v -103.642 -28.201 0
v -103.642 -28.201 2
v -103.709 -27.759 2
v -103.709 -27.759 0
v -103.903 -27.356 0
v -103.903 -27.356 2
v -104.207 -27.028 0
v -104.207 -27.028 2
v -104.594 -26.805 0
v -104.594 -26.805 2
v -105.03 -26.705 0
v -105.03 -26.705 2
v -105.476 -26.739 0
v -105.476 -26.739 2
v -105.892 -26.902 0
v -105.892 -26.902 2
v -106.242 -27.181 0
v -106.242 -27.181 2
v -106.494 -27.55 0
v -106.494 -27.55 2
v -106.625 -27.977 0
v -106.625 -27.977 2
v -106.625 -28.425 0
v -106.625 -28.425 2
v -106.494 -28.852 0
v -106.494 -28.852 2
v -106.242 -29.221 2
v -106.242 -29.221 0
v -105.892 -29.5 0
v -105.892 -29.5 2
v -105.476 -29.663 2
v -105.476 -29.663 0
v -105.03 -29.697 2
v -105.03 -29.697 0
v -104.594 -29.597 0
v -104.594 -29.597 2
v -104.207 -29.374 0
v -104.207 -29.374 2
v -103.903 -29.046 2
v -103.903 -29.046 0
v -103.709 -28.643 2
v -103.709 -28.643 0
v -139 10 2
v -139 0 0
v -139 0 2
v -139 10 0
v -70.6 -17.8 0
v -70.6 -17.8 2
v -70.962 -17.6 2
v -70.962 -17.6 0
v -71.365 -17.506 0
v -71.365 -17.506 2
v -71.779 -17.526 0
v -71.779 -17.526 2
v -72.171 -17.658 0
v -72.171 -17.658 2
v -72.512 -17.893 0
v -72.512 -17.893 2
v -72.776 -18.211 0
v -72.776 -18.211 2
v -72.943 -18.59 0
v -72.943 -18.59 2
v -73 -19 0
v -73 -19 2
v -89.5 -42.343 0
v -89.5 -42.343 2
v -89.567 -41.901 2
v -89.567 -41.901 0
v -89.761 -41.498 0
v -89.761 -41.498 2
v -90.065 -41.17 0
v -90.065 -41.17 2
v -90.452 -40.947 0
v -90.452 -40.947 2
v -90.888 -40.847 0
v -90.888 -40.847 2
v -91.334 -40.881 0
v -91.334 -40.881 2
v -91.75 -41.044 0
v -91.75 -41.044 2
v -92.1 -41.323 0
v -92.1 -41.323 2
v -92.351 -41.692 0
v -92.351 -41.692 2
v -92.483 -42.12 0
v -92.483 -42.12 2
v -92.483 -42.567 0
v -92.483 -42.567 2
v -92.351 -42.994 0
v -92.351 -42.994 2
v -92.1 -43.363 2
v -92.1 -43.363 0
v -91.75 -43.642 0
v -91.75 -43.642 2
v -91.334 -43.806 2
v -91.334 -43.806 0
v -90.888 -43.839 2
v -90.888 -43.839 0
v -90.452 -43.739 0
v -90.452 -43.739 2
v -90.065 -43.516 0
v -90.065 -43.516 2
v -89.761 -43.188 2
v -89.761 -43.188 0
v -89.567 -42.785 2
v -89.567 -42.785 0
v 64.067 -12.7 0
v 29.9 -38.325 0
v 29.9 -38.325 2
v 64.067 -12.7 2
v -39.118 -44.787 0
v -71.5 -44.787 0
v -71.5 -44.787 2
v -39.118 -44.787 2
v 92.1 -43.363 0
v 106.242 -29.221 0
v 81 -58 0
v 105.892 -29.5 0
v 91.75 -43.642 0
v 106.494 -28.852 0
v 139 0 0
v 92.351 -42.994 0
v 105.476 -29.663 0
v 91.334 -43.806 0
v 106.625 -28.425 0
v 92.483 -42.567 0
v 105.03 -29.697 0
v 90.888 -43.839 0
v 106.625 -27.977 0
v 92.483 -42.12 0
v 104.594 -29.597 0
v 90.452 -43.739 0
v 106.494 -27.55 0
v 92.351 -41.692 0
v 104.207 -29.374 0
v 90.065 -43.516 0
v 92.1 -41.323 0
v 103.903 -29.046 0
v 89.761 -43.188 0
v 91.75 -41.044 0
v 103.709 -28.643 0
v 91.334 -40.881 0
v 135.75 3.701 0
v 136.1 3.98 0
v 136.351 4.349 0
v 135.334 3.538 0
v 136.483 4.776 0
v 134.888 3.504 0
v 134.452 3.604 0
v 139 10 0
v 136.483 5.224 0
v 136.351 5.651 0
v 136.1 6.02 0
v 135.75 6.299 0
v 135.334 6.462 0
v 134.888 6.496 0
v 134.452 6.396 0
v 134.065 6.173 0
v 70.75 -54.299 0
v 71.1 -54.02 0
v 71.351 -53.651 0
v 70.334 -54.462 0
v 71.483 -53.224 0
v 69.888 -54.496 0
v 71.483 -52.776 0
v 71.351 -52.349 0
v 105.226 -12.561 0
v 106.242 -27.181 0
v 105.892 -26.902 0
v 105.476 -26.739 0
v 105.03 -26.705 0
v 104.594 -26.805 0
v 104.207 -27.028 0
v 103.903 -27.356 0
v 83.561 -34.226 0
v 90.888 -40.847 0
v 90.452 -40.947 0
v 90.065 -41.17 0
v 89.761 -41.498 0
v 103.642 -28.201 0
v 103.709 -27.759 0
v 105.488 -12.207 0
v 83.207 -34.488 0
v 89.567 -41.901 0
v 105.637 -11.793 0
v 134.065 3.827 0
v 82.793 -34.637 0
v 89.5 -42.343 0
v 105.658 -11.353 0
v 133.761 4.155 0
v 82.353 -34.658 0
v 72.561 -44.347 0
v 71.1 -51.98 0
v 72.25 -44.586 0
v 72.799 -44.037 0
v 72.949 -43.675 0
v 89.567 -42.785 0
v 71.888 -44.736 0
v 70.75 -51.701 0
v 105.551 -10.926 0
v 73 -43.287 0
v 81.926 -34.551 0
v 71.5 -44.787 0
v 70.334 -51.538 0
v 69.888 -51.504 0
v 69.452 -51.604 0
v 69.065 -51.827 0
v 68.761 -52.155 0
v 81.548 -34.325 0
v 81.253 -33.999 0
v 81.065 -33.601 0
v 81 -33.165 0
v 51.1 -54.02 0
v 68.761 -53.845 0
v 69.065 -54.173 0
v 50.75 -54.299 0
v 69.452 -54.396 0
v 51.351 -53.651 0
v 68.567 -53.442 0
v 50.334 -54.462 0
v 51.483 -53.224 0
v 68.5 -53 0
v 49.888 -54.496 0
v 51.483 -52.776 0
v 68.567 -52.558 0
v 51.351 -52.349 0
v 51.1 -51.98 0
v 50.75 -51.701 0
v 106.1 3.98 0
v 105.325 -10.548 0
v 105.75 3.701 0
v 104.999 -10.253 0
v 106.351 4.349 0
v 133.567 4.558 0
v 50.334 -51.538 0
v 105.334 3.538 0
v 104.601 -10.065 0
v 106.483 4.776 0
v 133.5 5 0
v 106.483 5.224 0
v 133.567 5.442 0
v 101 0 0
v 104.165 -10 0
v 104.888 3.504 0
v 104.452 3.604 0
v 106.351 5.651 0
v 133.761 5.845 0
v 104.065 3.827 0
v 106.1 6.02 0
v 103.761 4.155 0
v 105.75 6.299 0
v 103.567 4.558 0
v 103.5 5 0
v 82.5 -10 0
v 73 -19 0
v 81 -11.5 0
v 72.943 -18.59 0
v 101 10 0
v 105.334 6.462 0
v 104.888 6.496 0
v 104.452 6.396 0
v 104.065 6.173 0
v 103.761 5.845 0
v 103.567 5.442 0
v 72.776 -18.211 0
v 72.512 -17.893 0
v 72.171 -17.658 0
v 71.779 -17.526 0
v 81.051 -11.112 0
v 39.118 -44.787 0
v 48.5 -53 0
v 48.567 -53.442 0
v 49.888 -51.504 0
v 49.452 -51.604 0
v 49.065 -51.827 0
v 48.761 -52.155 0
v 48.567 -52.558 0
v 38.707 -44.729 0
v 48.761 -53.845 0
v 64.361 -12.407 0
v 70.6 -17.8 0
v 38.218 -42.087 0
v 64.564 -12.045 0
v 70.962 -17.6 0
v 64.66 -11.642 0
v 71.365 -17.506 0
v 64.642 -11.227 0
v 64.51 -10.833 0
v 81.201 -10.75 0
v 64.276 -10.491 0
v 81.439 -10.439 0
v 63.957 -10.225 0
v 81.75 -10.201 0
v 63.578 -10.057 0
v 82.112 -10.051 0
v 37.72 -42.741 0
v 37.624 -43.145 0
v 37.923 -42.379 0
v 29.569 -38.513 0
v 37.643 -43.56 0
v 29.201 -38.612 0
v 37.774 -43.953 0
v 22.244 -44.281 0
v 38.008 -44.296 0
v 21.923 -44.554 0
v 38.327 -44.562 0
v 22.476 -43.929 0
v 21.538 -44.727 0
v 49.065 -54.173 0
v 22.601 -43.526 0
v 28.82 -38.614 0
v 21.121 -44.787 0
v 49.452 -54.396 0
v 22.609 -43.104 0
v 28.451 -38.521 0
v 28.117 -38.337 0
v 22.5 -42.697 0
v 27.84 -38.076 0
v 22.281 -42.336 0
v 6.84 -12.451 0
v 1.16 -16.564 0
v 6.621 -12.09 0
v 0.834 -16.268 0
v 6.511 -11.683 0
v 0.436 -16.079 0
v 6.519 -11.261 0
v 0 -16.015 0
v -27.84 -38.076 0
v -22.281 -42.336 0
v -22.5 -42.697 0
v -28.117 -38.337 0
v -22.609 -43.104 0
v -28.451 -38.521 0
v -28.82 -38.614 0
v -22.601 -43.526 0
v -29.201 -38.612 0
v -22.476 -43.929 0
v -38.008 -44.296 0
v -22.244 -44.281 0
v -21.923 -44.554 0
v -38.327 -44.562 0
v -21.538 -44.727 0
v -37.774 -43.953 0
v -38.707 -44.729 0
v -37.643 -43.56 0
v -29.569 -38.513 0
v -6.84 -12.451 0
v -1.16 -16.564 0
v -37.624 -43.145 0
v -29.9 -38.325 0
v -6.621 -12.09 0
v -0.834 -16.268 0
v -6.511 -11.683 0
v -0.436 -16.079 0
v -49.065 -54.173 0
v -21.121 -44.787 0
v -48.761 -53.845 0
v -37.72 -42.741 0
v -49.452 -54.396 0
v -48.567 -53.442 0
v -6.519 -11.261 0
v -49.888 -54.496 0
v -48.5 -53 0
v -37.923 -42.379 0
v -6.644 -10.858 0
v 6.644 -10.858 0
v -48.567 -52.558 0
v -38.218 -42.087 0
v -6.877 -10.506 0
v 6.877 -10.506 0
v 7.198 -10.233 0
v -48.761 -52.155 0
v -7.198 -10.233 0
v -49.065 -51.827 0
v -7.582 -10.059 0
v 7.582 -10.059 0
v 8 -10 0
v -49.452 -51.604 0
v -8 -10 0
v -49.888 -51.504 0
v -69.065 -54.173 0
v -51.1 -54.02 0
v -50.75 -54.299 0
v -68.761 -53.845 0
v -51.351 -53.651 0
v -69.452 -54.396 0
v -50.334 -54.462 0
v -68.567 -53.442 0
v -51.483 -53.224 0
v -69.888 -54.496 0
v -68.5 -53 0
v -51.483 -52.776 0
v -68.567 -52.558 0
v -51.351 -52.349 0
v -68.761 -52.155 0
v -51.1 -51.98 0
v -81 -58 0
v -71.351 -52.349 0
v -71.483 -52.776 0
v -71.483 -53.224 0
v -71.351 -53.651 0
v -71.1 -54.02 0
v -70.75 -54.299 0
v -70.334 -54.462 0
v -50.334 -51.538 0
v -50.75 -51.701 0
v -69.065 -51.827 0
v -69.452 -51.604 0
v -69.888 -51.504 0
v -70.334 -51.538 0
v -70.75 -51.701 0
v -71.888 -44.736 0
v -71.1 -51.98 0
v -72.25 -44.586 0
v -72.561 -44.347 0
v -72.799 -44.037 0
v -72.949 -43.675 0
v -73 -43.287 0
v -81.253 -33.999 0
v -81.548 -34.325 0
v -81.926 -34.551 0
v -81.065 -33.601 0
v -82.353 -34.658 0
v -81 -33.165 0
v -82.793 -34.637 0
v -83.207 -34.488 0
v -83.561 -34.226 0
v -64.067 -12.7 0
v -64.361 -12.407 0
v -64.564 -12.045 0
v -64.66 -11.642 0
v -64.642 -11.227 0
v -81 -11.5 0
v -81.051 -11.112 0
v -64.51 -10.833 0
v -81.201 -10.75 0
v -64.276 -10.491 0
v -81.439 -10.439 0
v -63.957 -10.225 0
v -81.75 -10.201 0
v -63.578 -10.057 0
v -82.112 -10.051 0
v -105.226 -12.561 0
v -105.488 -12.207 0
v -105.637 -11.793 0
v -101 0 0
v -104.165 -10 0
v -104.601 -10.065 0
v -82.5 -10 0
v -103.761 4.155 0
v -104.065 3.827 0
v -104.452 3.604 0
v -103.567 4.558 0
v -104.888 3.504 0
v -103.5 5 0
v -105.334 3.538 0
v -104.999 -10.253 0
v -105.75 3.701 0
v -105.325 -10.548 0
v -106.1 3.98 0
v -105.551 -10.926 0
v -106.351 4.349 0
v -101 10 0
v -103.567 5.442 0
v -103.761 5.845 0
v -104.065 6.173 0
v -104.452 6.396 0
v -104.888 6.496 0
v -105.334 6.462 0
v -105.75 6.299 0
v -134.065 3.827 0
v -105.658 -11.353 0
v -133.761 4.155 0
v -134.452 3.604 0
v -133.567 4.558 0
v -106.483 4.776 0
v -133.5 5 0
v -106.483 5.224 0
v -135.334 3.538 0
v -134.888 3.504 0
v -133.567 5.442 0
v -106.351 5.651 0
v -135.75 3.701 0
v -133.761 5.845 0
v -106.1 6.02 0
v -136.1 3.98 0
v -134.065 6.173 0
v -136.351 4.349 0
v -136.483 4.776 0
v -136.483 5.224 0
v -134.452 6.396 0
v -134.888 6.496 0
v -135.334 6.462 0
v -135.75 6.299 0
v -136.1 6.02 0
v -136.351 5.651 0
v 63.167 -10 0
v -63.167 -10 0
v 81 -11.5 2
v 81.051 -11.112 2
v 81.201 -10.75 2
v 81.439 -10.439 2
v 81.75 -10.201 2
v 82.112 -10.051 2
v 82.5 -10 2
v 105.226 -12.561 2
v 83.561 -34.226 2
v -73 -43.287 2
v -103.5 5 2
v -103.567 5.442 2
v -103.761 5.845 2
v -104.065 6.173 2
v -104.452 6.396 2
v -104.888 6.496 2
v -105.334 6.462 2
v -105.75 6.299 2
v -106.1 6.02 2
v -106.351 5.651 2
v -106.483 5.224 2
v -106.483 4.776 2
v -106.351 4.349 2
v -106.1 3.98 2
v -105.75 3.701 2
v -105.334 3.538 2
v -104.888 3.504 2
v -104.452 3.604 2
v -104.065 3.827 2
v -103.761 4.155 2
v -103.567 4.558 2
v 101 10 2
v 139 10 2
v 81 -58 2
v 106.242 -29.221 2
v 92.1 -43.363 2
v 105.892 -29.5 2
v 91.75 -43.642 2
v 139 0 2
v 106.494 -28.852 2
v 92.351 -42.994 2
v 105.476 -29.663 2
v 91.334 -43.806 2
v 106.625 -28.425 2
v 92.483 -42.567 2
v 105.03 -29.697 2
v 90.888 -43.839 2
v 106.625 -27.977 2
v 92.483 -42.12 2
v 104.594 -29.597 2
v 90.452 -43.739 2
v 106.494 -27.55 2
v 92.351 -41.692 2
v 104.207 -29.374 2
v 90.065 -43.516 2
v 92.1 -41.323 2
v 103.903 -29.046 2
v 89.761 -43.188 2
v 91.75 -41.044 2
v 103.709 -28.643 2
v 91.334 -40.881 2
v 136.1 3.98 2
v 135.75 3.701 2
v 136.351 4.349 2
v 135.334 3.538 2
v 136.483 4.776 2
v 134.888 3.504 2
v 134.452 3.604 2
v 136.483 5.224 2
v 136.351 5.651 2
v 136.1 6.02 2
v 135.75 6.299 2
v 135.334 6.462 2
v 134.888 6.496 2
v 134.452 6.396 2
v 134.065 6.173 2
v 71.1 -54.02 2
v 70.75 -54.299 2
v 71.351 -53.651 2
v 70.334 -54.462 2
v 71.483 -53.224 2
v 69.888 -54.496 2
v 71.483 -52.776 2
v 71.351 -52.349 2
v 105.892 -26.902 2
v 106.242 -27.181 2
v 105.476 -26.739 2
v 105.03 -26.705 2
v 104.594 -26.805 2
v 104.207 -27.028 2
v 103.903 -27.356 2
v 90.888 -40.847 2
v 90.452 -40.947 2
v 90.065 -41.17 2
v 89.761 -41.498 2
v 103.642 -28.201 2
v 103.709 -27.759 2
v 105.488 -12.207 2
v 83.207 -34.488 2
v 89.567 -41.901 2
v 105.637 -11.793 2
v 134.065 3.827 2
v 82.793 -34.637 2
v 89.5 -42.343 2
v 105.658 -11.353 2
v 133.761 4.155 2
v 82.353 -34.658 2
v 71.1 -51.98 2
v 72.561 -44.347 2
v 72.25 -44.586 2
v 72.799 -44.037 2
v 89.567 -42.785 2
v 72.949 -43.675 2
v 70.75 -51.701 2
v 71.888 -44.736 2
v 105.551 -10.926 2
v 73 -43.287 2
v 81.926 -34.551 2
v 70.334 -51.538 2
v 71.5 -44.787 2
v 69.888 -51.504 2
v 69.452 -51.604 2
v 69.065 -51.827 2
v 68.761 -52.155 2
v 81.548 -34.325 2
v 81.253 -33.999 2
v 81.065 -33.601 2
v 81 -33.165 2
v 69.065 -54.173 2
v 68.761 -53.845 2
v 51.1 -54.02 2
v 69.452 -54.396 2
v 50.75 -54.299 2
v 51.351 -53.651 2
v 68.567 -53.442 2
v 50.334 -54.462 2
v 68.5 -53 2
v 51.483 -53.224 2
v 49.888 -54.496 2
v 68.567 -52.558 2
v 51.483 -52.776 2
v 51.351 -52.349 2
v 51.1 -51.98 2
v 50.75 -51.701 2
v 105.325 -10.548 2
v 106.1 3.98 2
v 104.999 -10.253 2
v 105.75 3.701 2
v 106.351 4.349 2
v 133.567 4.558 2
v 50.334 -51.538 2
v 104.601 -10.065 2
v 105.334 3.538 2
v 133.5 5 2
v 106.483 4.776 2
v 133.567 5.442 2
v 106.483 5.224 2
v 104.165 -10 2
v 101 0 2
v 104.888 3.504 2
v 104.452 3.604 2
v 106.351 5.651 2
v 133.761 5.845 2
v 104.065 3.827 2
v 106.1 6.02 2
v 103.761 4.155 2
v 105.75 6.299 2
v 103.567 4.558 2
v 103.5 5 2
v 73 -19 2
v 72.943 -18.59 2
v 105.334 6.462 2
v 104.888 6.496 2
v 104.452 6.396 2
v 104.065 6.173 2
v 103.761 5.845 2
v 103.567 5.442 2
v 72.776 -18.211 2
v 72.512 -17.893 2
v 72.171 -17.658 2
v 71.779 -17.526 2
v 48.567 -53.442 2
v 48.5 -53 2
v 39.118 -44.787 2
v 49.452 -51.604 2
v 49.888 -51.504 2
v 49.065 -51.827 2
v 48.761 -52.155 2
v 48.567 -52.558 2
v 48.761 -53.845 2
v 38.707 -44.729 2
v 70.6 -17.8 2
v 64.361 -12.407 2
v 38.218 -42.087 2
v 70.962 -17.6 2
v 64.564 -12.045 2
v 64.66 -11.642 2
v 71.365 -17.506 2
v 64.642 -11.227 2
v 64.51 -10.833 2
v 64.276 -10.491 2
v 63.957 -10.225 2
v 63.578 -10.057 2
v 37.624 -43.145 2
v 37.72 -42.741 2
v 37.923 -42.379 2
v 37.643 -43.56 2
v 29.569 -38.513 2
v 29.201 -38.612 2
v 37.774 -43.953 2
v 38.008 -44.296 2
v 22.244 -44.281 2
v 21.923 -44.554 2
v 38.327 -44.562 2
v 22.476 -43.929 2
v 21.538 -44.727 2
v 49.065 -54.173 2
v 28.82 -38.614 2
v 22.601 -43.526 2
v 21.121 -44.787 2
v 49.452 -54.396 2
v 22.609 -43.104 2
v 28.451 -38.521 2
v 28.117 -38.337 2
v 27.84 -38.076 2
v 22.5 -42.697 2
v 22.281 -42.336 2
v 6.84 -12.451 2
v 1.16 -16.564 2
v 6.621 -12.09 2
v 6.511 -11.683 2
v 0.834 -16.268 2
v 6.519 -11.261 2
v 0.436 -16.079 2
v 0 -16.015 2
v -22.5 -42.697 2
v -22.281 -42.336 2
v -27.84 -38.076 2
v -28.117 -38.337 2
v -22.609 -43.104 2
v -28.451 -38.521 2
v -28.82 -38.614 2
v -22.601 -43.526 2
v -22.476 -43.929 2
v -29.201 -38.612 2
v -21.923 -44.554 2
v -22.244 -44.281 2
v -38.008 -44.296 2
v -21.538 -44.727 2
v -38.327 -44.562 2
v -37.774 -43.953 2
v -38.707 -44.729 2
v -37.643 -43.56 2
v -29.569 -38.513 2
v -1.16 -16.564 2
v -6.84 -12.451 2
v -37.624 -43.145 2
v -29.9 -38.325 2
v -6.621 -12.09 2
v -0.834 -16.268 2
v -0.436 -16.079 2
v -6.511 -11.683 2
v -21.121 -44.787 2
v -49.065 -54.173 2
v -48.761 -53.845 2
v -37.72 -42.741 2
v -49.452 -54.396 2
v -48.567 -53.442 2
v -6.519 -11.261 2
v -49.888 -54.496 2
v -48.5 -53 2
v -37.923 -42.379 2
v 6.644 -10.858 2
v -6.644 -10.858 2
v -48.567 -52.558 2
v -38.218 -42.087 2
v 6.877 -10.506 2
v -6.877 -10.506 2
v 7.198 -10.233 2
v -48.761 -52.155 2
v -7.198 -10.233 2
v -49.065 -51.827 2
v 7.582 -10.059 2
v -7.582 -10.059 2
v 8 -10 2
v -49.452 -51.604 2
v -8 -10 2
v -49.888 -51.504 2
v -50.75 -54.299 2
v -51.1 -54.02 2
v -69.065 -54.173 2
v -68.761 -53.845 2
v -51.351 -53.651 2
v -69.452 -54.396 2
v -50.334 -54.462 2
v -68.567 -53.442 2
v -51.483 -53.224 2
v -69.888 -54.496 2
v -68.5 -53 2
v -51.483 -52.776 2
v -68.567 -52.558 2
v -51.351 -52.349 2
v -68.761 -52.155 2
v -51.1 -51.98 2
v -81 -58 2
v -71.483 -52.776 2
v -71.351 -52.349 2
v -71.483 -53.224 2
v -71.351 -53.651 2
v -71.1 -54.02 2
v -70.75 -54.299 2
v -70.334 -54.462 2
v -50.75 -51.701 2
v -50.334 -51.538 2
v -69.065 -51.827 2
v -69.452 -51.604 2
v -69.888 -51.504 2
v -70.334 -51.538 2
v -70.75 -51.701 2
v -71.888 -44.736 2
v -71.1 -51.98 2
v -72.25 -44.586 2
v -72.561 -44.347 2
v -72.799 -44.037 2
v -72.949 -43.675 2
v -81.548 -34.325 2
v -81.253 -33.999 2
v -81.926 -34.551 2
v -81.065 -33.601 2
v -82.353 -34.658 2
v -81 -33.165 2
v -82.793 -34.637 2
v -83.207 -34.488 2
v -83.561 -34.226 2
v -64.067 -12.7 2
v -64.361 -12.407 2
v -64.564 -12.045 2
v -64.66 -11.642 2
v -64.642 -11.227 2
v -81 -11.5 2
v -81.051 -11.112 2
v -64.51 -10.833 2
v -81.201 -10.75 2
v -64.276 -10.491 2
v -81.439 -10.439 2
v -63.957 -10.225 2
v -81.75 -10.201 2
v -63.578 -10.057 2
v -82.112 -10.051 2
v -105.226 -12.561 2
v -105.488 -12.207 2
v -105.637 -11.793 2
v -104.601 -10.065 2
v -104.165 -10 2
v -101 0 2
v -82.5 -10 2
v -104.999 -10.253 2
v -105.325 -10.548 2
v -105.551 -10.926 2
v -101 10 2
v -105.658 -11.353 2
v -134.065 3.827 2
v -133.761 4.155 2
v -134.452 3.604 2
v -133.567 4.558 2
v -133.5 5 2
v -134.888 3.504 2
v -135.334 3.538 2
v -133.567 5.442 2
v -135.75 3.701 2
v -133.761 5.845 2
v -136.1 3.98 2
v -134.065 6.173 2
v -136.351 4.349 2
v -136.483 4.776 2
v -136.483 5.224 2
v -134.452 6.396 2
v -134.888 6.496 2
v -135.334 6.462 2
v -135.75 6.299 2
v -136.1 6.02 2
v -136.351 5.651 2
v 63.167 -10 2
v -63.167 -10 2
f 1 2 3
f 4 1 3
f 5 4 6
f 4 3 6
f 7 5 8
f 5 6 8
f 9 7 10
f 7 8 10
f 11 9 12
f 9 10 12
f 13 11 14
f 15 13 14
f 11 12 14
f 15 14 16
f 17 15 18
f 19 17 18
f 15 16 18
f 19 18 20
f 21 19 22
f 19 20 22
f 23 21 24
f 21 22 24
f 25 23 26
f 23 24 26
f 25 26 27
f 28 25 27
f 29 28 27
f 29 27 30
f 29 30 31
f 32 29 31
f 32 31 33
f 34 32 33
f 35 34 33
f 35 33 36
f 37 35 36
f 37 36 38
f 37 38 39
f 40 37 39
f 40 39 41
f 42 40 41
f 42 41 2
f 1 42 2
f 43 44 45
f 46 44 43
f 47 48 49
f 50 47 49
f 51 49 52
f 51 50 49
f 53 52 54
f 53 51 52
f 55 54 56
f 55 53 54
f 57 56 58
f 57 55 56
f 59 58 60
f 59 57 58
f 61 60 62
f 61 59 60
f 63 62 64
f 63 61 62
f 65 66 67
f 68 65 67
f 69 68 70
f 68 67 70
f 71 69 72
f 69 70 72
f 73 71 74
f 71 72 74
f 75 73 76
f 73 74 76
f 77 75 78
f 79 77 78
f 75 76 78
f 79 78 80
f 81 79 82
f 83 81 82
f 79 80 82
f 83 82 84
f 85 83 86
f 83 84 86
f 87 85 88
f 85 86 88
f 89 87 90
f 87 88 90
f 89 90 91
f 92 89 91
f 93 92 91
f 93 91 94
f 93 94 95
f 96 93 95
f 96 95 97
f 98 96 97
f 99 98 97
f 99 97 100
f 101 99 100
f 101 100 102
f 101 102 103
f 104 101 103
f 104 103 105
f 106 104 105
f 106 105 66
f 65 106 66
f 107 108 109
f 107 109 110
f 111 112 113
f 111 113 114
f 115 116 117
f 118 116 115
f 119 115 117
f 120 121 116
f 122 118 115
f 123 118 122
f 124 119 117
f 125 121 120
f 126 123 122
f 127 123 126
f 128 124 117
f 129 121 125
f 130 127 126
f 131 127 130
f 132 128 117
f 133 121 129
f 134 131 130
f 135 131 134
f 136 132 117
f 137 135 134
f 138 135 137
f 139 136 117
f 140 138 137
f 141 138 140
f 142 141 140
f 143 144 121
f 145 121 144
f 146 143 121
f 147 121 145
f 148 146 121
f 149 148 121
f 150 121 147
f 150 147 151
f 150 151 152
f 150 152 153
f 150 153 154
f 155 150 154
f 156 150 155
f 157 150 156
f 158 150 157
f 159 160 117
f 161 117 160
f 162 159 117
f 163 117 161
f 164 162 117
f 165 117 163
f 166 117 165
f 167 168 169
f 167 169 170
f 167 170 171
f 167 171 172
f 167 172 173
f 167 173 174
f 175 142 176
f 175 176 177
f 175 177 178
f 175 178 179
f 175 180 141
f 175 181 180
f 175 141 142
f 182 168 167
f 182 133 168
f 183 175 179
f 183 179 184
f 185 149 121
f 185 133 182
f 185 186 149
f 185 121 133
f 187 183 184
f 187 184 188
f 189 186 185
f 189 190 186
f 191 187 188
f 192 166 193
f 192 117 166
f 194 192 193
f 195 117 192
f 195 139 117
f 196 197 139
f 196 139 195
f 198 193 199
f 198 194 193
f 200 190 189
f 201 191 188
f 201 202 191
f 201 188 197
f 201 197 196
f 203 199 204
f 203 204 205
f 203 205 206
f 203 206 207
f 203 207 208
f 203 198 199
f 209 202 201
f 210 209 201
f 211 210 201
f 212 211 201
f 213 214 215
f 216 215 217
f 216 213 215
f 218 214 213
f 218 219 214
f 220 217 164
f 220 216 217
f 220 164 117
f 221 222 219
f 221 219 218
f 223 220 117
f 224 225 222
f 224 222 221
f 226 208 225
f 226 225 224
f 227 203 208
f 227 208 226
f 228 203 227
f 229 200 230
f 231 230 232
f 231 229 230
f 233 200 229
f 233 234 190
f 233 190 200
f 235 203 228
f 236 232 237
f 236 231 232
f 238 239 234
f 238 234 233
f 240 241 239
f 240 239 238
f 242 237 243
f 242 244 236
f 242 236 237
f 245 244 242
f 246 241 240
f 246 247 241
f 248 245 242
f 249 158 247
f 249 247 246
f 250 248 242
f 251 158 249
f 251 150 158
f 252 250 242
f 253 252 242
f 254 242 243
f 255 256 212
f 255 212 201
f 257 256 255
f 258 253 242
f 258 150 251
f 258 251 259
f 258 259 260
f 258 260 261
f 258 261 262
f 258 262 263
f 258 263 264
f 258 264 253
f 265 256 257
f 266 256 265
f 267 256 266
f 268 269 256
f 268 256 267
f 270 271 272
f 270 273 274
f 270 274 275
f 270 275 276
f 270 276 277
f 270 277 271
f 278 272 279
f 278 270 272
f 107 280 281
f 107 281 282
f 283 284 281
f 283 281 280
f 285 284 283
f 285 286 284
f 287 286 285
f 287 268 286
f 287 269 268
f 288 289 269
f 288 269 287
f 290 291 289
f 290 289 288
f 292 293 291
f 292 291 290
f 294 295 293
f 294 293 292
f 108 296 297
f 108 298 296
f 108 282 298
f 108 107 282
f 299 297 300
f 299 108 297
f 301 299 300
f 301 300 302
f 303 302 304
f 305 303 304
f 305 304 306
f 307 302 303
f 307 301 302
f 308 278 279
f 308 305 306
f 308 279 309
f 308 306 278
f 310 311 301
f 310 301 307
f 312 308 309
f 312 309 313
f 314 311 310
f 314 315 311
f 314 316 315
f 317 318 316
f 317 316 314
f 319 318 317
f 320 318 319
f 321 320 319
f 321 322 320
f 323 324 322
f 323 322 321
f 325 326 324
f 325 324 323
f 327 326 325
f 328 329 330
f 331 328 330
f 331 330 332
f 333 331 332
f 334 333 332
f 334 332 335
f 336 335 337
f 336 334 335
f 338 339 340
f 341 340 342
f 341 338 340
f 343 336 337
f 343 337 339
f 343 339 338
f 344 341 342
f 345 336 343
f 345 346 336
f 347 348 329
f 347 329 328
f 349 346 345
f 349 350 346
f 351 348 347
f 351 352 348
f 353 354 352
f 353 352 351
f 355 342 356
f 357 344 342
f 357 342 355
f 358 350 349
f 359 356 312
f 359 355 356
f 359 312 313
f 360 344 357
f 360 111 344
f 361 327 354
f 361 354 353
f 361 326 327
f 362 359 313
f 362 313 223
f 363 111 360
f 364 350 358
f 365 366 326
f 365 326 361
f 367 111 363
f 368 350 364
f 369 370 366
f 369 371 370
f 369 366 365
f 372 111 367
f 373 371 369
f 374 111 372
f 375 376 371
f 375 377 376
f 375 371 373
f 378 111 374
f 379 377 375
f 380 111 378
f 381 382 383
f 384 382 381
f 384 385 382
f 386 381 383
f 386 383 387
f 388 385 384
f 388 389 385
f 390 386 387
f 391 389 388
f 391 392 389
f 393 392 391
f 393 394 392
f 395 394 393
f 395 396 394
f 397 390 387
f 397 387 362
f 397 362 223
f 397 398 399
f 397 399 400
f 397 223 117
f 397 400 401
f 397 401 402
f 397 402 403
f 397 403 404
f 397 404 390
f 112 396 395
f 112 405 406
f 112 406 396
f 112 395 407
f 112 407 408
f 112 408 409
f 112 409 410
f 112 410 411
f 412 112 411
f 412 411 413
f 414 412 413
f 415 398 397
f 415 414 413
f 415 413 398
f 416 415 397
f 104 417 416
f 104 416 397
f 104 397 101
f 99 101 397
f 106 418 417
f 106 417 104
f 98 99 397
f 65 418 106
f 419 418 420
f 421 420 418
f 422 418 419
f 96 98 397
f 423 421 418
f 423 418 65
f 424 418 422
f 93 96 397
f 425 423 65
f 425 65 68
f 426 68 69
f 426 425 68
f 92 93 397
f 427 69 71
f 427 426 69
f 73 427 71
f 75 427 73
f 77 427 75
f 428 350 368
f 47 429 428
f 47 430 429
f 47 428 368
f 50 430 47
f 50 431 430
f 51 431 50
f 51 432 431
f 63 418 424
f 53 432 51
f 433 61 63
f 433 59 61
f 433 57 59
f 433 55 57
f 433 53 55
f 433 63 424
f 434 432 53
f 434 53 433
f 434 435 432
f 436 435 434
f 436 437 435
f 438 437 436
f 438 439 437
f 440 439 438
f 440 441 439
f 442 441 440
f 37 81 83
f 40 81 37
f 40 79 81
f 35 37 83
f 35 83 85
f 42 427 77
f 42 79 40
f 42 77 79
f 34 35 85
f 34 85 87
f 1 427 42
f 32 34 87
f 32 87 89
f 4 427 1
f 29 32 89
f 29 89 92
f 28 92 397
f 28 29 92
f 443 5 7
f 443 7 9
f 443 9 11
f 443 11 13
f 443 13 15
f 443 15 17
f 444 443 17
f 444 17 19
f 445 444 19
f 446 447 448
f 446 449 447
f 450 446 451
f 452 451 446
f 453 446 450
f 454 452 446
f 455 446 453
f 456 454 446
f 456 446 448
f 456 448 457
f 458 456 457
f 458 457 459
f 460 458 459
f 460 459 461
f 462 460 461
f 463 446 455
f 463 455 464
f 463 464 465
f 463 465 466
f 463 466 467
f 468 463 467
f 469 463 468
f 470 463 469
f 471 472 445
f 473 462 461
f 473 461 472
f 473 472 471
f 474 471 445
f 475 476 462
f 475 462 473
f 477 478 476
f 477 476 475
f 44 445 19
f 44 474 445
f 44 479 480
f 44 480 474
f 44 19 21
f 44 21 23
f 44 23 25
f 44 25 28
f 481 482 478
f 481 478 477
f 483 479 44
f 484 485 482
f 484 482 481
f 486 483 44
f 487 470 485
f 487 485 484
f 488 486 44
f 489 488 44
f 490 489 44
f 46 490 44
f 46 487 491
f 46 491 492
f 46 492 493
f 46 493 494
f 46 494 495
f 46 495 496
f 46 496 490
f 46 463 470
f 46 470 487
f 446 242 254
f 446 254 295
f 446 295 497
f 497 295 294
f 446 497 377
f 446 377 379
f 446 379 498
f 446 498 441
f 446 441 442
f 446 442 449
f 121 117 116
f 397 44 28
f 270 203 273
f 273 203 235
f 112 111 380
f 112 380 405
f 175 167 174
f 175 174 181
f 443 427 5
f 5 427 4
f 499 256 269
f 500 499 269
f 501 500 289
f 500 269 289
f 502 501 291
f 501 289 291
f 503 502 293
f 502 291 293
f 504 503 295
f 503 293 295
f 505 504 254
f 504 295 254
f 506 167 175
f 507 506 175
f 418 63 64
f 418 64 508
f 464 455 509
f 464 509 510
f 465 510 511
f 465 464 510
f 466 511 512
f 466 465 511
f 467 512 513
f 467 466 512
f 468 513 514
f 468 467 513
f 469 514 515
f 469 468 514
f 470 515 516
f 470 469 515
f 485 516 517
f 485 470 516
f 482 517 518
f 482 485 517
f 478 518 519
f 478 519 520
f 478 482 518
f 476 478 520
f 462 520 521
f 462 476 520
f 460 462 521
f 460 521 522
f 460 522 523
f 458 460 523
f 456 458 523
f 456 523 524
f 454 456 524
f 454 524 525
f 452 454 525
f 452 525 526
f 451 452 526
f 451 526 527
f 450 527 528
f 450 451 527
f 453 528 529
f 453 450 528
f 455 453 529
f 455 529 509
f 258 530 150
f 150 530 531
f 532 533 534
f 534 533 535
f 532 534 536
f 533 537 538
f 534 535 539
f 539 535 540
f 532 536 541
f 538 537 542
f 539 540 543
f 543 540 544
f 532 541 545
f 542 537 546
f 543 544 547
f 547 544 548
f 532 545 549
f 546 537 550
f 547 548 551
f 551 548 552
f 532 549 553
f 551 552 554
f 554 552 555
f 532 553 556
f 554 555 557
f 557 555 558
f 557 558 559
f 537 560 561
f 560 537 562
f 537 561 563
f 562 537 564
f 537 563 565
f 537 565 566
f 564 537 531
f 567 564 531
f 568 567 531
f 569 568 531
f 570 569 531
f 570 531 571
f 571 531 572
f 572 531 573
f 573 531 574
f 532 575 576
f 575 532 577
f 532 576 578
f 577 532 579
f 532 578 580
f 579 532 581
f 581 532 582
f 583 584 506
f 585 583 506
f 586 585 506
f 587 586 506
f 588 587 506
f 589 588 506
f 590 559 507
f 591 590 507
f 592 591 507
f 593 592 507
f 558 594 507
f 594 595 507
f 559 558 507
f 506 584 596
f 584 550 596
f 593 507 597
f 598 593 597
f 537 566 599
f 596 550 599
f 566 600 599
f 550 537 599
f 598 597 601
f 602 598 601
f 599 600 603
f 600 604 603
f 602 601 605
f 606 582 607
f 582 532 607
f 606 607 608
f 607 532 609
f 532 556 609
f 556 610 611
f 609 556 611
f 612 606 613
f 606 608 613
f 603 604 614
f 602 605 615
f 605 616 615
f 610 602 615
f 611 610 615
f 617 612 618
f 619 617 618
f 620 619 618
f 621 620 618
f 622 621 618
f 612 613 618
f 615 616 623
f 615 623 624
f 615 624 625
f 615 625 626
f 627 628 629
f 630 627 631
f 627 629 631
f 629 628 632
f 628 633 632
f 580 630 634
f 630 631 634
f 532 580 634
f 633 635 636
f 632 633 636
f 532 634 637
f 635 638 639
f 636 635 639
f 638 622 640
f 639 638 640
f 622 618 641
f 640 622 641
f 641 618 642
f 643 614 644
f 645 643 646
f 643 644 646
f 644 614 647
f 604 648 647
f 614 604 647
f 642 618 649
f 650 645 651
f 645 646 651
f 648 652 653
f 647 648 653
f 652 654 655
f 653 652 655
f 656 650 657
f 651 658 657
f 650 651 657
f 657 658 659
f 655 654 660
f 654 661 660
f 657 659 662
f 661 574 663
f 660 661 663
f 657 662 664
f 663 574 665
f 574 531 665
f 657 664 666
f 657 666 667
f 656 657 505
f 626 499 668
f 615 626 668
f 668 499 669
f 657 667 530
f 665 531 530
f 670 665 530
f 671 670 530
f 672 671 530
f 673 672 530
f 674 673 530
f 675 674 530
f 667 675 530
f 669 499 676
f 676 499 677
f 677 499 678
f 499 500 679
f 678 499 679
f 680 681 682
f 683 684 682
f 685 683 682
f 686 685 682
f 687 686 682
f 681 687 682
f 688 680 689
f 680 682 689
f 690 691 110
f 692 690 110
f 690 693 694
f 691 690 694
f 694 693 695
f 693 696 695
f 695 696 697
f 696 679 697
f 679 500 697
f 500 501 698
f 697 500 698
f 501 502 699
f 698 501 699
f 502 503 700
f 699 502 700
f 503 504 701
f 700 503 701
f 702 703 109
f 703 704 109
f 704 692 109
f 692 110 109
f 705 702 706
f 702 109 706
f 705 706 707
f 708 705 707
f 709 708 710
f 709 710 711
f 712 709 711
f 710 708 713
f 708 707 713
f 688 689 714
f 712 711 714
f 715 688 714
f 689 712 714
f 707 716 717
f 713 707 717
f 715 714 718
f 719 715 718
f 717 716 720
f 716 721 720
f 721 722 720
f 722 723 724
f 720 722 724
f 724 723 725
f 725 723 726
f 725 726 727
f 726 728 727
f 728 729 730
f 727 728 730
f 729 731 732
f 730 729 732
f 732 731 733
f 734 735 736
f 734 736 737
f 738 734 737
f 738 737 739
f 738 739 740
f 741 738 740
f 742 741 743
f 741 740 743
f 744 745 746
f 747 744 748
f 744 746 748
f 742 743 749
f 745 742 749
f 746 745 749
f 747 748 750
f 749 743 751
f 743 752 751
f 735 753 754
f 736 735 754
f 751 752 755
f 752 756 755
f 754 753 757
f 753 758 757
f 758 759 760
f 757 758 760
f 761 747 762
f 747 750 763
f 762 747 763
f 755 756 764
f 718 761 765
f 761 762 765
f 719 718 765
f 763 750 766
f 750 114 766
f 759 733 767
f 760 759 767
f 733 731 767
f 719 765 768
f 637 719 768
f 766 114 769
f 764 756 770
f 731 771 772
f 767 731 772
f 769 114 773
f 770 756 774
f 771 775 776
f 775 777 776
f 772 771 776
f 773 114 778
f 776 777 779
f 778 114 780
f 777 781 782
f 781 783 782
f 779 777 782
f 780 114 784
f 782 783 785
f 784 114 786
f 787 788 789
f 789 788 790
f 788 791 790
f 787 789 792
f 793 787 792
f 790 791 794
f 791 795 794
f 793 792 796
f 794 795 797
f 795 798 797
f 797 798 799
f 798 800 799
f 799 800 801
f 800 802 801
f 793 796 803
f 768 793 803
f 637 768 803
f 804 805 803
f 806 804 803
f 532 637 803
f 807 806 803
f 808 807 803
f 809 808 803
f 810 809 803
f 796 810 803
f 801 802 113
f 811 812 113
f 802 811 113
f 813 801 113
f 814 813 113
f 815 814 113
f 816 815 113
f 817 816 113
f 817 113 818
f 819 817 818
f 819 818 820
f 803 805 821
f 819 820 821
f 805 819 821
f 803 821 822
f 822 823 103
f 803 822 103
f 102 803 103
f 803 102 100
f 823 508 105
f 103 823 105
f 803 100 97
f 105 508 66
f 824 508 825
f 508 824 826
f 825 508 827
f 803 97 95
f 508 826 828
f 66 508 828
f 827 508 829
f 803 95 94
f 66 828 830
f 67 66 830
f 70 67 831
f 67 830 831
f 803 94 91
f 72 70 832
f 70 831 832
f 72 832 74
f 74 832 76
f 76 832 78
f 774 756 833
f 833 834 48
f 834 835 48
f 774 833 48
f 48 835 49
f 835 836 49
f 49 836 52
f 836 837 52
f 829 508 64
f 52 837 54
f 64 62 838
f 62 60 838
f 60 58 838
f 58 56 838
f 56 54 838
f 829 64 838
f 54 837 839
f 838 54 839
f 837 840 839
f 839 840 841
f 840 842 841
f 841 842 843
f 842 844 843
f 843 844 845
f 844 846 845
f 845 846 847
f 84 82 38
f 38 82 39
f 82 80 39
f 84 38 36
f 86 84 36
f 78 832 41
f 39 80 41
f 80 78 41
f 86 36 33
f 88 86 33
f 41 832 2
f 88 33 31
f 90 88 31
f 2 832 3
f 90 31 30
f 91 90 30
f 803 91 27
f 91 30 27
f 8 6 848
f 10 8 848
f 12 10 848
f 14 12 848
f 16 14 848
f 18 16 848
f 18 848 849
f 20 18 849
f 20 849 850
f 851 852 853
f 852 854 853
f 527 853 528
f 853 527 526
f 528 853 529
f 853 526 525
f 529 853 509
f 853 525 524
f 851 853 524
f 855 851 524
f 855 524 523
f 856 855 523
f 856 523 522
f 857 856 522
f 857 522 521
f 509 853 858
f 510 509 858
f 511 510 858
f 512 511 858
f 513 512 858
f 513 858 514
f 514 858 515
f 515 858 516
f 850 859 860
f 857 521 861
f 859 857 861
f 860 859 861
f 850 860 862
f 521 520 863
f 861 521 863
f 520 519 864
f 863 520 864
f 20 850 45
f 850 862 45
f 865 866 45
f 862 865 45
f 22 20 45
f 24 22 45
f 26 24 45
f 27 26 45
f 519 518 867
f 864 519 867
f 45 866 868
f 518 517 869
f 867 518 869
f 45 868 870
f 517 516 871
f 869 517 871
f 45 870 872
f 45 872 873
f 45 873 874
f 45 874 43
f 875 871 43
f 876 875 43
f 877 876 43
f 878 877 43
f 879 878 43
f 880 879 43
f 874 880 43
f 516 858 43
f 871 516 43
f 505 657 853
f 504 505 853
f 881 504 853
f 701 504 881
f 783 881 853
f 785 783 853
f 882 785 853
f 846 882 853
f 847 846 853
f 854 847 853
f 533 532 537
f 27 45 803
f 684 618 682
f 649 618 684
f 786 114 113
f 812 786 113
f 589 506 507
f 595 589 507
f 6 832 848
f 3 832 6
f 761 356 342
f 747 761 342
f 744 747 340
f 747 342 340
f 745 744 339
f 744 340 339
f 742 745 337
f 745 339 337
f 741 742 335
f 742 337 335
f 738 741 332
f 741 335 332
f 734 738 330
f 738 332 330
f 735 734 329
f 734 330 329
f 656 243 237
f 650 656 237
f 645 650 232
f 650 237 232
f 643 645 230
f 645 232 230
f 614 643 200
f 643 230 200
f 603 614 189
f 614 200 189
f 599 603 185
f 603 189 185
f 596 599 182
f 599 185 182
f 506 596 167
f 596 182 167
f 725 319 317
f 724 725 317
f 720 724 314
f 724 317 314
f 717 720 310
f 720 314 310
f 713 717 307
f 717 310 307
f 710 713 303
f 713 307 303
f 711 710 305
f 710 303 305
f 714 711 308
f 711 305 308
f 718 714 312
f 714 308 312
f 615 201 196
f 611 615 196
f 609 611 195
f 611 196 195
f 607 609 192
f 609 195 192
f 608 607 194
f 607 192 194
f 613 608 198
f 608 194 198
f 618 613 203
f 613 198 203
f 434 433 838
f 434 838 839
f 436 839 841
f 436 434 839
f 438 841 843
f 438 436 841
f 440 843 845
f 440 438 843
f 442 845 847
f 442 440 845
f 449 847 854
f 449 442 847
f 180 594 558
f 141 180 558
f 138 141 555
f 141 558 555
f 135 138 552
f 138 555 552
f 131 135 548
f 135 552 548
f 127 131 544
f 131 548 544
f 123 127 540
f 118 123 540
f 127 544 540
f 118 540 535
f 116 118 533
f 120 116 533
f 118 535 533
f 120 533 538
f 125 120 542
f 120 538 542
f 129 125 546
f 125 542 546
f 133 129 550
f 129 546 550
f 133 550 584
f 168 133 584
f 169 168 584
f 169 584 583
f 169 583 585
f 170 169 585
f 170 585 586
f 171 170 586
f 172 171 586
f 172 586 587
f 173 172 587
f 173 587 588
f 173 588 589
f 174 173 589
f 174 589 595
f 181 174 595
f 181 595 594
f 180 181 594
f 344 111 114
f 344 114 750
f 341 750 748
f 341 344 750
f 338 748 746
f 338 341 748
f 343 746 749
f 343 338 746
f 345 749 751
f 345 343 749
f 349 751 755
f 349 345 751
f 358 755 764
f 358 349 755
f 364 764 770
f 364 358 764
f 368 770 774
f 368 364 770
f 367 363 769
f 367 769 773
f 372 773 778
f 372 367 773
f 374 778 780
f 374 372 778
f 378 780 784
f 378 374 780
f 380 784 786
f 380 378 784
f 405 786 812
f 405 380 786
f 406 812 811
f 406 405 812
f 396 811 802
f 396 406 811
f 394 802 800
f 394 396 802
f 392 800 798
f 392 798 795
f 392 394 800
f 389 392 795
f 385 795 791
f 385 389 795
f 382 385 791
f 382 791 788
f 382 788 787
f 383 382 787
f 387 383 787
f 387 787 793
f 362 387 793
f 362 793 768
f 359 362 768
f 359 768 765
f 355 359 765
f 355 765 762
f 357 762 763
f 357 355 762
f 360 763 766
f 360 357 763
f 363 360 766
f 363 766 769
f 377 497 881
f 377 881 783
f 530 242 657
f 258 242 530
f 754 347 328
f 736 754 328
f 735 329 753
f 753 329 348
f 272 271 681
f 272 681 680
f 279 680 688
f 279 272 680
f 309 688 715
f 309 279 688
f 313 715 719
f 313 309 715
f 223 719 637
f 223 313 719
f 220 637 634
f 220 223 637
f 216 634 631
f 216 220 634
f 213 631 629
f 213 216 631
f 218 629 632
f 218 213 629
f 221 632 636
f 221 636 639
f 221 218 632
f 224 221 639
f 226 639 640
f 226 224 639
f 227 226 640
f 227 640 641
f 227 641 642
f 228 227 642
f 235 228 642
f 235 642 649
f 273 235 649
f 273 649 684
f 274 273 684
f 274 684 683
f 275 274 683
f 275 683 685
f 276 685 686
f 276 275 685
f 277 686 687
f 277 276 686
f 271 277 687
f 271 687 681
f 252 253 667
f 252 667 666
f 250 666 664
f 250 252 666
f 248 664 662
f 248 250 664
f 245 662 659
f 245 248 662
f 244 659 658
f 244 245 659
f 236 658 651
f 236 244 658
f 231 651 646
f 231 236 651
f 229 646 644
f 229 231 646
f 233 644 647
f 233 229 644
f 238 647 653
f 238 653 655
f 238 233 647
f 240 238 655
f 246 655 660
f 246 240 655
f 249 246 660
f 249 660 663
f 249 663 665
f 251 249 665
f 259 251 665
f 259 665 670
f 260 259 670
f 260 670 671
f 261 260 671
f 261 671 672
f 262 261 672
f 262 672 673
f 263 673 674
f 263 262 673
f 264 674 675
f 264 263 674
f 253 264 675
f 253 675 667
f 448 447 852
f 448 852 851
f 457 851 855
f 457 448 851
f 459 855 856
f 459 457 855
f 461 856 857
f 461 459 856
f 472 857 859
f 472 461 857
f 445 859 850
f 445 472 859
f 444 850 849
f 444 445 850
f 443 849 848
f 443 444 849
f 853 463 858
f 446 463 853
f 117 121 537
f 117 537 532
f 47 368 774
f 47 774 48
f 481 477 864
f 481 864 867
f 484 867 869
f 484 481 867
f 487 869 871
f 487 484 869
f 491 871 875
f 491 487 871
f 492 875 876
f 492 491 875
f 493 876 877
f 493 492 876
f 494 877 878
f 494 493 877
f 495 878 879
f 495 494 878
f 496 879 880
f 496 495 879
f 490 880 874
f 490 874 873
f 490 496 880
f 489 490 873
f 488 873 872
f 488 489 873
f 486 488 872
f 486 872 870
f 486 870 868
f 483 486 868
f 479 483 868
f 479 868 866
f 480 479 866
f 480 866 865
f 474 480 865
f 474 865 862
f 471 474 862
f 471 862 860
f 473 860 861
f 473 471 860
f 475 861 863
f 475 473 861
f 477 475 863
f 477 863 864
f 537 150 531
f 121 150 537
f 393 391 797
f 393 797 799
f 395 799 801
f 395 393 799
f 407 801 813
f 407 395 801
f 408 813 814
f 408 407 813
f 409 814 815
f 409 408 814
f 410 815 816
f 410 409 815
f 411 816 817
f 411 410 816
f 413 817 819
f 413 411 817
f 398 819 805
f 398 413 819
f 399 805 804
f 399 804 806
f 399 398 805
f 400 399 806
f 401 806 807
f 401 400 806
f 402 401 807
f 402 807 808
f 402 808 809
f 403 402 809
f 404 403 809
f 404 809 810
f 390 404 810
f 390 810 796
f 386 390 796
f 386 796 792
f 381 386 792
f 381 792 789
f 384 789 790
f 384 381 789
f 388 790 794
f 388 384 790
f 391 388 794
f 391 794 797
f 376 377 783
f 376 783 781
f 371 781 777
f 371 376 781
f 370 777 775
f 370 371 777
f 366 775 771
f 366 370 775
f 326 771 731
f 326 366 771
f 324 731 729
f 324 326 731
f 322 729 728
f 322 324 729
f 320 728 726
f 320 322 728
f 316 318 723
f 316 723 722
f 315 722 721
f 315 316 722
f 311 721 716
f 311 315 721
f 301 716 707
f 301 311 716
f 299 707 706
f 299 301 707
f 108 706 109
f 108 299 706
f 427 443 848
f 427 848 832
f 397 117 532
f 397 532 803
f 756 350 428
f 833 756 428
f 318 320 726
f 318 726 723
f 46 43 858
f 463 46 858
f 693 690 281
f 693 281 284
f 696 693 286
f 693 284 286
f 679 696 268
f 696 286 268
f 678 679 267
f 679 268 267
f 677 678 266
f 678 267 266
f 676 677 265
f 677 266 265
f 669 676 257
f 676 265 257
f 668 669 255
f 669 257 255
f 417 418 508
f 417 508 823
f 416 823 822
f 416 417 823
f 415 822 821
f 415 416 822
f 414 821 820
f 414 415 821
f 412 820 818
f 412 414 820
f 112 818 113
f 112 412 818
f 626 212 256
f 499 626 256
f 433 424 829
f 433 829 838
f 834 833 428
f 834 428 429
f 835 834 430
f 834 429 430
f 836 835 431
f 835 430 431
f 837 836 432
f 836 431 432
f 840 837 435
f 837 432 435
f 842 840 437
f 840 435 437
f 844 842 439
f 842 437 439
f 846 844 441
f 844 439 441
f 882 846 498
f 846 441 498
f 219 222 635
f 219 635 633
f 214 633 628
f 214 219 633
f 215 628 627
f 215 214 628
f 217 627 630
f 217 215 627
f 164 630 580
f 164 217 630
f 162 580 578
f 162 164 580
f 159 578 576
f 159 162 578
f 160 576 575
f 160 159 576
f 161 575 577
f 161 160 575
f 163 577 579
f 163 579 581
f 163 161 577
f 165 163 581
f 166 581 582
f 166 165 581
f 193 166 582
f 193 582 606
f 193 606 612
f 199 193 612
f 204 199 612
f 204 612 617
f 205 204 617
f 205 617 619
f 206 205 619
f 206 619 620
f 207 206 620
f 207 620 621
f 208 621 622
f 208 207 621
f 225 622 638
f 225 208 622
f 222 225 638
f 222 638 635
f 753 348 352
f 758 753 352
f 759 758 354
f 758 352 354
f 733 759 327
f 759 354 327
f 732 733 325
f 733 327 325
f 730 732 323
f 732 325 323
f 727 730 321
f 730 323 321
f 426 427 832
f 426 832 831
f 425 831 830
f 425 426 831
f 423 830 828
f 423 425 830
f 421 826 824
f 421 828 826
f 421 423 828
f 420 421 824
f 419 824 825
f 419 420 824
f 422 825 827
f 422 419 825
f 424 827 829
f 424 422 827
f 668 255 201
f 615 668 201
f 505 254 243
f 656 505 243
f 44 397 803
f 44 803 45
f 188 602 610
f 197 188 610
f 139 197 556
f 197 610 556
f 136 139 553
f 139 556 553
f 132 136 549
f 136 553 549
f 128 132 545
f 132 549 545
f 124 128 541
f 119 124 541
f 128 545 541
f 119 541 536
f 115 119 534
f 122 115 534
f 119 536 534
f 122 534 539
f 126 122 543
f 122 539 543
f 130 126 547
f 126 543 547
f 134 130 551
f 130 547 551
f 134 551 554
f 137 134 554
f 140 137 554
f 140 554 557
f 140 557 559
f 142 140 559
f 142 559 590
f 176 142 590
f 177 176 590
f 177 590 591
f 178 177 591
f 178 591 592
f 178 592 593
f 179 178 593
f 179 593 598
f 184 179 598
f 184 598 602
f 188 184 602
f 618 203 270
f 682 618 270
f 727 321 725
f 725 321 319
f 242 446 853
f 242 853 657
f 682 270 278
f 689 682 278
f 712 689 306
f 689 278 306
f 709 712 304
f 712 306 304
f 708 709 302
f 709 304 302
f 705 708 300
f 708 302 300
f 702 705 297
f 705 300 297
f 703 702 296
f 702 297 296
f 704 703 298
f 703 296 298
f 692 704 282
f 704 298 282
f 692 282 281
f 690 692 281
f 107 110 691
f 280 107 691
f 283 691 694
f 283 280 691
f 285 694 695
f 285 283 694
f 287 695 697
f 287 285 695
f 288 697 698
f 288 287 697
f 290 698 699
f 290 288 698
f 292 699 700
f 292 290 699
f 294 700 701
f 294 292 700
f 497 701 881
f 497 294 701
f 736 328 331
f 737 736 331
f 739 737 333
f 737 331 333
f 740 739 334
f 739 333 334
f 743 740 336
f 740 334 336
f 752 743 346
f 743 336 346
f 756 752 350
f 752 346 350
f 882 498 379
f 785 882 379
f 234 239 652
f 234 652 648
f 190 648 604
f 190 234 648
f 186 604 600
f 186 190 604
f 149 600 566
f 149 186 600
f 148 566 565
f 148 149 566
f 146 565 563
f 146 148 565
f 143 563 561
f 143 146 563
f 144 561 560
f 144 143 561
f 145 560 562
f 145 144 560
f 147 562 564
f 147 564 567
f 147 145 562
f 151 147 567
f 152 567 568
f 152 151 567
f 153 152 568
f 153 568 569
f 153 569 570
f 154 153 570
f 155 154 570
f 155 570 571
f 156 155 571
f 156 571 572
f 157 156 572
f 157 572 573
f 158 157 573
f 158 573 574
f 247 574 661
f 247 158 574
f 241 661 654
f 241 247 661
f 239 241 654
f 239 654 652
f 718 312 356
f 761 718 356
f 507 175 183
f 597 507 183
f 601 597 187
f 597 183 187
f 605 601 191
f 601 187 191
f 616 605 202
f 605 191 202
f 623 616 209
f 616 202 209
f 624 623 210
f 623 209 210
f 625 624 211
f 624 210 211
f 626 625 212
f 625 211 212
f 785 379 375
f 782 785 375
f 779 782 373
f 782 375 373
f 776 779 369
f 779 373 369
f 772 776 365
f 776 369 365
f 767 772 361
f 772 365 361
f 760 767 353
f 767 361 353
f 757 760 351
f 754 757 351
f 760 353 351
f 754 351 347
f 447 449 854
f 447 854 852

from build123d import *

# Parameters (mm, degrees)
SKETCH_1_R               = 1.5
EXTRUDE_1_DEPTH          = 2
SKETCH_2_R               = 1.5
CUT_EXTRUDE_1_DEPTH      = 151.628682528
SKETCH_3_W               = 278
SKETCH_3_H               = 20
CUT_EXTRUDE_2_DEPTH      = 151.628682528
CUT_EXTRUDE_3_DEPTH      = 151.628682528
CUT_EXTRUDE_3_DEPTH_BACK = 151.628682528


with BuildPart() as part:
    # 草图1 → 凸台-拉伸1 (new body)
    with BuildSketch(Plane.XY):
        Polygon((-101, 30), (-101, 0), (101, 0), (101, 30), (139, 30), (139, 0), (81, -58), (-81, -58), (-139, 0), (-139, 30), align=None)
        with Locations((-135, 25)):
            Circle(SKETCH_1_R, mode=Mode.SUBTRACT)
        with Locations((-105, 25)):
            Circle(SKETCH_1_R, mode=Mode.SUBTRACT)
        with Locations((-105, 5)):
            Circle(SKETCH_1_R, mode=Mode.SUBTRACT)
        with Locations((-135, 5)):
            Circle(SKETCH_1_R, mode=Mode.SUBTRACT)
        with Locations(Location((135, 5, 0), (0, 0, 180))):
            Circle(SKETCH_1_R, mode=Mode.SUBTRACT)
        with Locations(Location((105, 5, 0), (0, 0, 180))):
            Circle(SKETCH_1_R, mode=Mode.SUBTRACT)
        with Locations(Location((105, 25, 0), (0, 0, 180))):
            Circle(SKETCH_1_R, mode=Mode.SUBTRACT)
        with Locations(Location((135, 25, 0), (0, 0, 180))):
            Circle(SKETCH_1_R, mode=Mode.SUBTRACT)
        with Locations((-70, -53)):
            Circle(SKETCH_1_R, mode=Mode.SUBTRACT)
        with Locations((-50, -53)):
            Circle(SKETCH_1_R, mode=Mode.SUBTRACT)
        with Locations(Location((50, -53, 0), (0, 0, 180))):
            Circle(SKETCH_1_R, mode=Mode.SUBTRACT)
        with Locations(Location((70, -53, 0), (0, 0, 180))):
            Circle(SKETCH_1_R, mode=Mode.SUBTRACT)
    extrude(amount=EXTRUDE_1_DEPTH)

    # 草图2 → 切除-拉伸1 (cut, through all)
    with BuildSketch(Plane.XY.offset(2)):
        with Locations((-105.142135624, -28.201010127)):
            Circle(SKETCH_2_R)
        with Locations((-91, -42.343145751)):
            Circle(SKETCH_2_R)
        with Locations(Location((91, -42.343145751, 0), (0, 0, 180))):
            Circle(SKETCH_2_R)
        with Locations(Location((105.142135624, -28.201010127, 0), (0, 0, 180))):
            Circle(SKETCH_2_R)
    extrude(amount=-CUT_EXTRUDE_1_DEPTH, mode=Mode.SUBTRACT)

    # 草图3 → 切除-拉伸2 (cut, through all)
    with BuildSketch(Plane.XY.offset(2)):
        with Locations((0, 20)):
            Rectangle(SKETCH_3_W, SKETCH_3_H)
    extrude(amount=-CUT_EXTRUDE_2_DEPTH, mode=Mode.SUBTRACT)

    # 草图4 → 切除-拉伸3 (cut, two sides: drawn at the far end of the back side and taken through both)
    with BuildSketch(Plane.XY.offset(2).offset(-CUT_EXTRUDE_3_DEPTH_BACK)):
        with BuildLine():
            Line((-105.226136393, -12.560660172), (-83.560660172, -34.226136393))
            ThreePointArc((-83.560660172, -34.226136393), (-81.925974851, -34.55129552), (-81, -33.165476221))
            Line((-81, -33.165476221), (-81, -11.5))
            ThreePointArc((-81, -11.5), (-81.439339828, -10.439339828), (-82.5, -10))
            Line((-82.5, -10), (-104.165476221, -10))
            ThreePointArc((-104.165476221, -10), (-105.55129552, -10.925974851), (-105.226136393, -12.560660172))
        make_face()
        with BuildLine():
            Line((-73, -19), (-73, -43.286796564))
            ThreePointArc((-73, -43.286796564), (-72.560660172, -44.347456736), (-71.5, -44.786796564))
            Line((-71.5, -44.786796564), (-39.117604581, -44.786796564))
            ThreePointArc((-39.117604581, -44.786796564), (-37.694579634, -43.761138213), (-38.217604581, -42.086796564))
            Line((-38.217604581, -42.086796564), (-70.6, -17.8))
            ThreePointArc((-70.6, -17.8), (-72.170820393, -17.658359214), (-73, -19))
        make_face()
        with BuildLine():
            Line((-63.166666667, -10), (-8, -10))
            ThreePointArc((-8, -10), (-6.644239805, -10.858194505), (-6.839820875, -12.450780941))
            Line((-6.839820875, -12.450780941), (-27.839820875, -38.075780941))
            ThreePointArc((-27.839820875, -38.075780941), (-28.819858864, -38.614143771), (-29.9, -38.325))
            Line((-29.9, -38.325), (-64.066666667, -12.7))
            ThreePointArc((-64.066666667, -12.7), (-64.589691614, -11.025658351), (-63.166666667, -10))
        make_face()
        with BuildLine():
            Line((29.9, -38.325), (64.066666667, -12.7))
            ThreePointArc((64.066666667, -12.7), (64.589691614, -11.025658351), (63.166666667, -10))
            Line((63.166666667, -10), (8, -10))
            ThreePointArc((8, -10), (6.644239805, -10.858194505), (6.839820875, -12.450780941))
            Line((6.839820875, -12.450780941), (27.839820875, -38.075780941))
            ThreePointArc((27.839820875, -38.075780941), (28.819858864, -38.614143771), (29.9, -38.325))
        make_face()
        with BuildLine():
            Line((38.217604581, -42.086796564), (70.6, -17.8))
            ThreePointArc((70.6, -17.8), (72.170820393, -17.658359214), (73, -19))
            Line((73, -19), (73, -43.286796564))
            ThreePointArc((73, -43.286796564), (72.560660172, -44.347456736), (71.5, -44.786796564))
            Line((71.5, -44.786796564), (39.117604581, -44.786796564))
            ThreePointArc((39.117604581, -44.786796564), (37.694579634, -43.761138213), (38.217604581, -42.086796564))
        make_face()
        with BuildLine():
            Line((82.5, -10), (104.165476221, -10))
            ThreePointArc((104.165476221, -10), (105.55129552, -10.925974851), (105.226136393, -12.560660172))
            Line((105.226136393, -12.560660172), (83.560660172, -34.226136393))
            ThreePointArc((83.560660172, -34.226136393), (81.925974851, -34.55129552), (81, -33.165476221))
            Line((81, -33.165476221), (81, -11.5))
            ThreePointArc((81, -11.5), (81.439339828, -10.439339828), (82.5, -10))
        make_face()
        with BuildLine():
            Line((-22.280808546, -42.336015623), (-1.160179125, -16.563819008))
            ThreePointArc((-1.160179125, -16.563819008), (0, -16.014599949), (1.160179125, -16.563819008))
            Line((1.160179125, -16.563819008), (22.280808546, -42.336015623))
            ThreePointArc((22.280808546, -42.336015623), (22.476389616, -43.92860206), (21.120629421, -44.786796564))
            Line((21.120629421, -44.786796564), (-21.120629421, -44.786796564))
            ThreePointArc((-21.120629421, -44.786796564), (-22.476389616, -43.92860206), (-22.280808546, -42.336015623))
        make_face()
    extrude(amount=CUT_EXTRUDE_3_DEPTH + CUT_EXTRUDE_3_DEPTH_BACK, mode=Mode.SUBTRACT)


solid = part.part
